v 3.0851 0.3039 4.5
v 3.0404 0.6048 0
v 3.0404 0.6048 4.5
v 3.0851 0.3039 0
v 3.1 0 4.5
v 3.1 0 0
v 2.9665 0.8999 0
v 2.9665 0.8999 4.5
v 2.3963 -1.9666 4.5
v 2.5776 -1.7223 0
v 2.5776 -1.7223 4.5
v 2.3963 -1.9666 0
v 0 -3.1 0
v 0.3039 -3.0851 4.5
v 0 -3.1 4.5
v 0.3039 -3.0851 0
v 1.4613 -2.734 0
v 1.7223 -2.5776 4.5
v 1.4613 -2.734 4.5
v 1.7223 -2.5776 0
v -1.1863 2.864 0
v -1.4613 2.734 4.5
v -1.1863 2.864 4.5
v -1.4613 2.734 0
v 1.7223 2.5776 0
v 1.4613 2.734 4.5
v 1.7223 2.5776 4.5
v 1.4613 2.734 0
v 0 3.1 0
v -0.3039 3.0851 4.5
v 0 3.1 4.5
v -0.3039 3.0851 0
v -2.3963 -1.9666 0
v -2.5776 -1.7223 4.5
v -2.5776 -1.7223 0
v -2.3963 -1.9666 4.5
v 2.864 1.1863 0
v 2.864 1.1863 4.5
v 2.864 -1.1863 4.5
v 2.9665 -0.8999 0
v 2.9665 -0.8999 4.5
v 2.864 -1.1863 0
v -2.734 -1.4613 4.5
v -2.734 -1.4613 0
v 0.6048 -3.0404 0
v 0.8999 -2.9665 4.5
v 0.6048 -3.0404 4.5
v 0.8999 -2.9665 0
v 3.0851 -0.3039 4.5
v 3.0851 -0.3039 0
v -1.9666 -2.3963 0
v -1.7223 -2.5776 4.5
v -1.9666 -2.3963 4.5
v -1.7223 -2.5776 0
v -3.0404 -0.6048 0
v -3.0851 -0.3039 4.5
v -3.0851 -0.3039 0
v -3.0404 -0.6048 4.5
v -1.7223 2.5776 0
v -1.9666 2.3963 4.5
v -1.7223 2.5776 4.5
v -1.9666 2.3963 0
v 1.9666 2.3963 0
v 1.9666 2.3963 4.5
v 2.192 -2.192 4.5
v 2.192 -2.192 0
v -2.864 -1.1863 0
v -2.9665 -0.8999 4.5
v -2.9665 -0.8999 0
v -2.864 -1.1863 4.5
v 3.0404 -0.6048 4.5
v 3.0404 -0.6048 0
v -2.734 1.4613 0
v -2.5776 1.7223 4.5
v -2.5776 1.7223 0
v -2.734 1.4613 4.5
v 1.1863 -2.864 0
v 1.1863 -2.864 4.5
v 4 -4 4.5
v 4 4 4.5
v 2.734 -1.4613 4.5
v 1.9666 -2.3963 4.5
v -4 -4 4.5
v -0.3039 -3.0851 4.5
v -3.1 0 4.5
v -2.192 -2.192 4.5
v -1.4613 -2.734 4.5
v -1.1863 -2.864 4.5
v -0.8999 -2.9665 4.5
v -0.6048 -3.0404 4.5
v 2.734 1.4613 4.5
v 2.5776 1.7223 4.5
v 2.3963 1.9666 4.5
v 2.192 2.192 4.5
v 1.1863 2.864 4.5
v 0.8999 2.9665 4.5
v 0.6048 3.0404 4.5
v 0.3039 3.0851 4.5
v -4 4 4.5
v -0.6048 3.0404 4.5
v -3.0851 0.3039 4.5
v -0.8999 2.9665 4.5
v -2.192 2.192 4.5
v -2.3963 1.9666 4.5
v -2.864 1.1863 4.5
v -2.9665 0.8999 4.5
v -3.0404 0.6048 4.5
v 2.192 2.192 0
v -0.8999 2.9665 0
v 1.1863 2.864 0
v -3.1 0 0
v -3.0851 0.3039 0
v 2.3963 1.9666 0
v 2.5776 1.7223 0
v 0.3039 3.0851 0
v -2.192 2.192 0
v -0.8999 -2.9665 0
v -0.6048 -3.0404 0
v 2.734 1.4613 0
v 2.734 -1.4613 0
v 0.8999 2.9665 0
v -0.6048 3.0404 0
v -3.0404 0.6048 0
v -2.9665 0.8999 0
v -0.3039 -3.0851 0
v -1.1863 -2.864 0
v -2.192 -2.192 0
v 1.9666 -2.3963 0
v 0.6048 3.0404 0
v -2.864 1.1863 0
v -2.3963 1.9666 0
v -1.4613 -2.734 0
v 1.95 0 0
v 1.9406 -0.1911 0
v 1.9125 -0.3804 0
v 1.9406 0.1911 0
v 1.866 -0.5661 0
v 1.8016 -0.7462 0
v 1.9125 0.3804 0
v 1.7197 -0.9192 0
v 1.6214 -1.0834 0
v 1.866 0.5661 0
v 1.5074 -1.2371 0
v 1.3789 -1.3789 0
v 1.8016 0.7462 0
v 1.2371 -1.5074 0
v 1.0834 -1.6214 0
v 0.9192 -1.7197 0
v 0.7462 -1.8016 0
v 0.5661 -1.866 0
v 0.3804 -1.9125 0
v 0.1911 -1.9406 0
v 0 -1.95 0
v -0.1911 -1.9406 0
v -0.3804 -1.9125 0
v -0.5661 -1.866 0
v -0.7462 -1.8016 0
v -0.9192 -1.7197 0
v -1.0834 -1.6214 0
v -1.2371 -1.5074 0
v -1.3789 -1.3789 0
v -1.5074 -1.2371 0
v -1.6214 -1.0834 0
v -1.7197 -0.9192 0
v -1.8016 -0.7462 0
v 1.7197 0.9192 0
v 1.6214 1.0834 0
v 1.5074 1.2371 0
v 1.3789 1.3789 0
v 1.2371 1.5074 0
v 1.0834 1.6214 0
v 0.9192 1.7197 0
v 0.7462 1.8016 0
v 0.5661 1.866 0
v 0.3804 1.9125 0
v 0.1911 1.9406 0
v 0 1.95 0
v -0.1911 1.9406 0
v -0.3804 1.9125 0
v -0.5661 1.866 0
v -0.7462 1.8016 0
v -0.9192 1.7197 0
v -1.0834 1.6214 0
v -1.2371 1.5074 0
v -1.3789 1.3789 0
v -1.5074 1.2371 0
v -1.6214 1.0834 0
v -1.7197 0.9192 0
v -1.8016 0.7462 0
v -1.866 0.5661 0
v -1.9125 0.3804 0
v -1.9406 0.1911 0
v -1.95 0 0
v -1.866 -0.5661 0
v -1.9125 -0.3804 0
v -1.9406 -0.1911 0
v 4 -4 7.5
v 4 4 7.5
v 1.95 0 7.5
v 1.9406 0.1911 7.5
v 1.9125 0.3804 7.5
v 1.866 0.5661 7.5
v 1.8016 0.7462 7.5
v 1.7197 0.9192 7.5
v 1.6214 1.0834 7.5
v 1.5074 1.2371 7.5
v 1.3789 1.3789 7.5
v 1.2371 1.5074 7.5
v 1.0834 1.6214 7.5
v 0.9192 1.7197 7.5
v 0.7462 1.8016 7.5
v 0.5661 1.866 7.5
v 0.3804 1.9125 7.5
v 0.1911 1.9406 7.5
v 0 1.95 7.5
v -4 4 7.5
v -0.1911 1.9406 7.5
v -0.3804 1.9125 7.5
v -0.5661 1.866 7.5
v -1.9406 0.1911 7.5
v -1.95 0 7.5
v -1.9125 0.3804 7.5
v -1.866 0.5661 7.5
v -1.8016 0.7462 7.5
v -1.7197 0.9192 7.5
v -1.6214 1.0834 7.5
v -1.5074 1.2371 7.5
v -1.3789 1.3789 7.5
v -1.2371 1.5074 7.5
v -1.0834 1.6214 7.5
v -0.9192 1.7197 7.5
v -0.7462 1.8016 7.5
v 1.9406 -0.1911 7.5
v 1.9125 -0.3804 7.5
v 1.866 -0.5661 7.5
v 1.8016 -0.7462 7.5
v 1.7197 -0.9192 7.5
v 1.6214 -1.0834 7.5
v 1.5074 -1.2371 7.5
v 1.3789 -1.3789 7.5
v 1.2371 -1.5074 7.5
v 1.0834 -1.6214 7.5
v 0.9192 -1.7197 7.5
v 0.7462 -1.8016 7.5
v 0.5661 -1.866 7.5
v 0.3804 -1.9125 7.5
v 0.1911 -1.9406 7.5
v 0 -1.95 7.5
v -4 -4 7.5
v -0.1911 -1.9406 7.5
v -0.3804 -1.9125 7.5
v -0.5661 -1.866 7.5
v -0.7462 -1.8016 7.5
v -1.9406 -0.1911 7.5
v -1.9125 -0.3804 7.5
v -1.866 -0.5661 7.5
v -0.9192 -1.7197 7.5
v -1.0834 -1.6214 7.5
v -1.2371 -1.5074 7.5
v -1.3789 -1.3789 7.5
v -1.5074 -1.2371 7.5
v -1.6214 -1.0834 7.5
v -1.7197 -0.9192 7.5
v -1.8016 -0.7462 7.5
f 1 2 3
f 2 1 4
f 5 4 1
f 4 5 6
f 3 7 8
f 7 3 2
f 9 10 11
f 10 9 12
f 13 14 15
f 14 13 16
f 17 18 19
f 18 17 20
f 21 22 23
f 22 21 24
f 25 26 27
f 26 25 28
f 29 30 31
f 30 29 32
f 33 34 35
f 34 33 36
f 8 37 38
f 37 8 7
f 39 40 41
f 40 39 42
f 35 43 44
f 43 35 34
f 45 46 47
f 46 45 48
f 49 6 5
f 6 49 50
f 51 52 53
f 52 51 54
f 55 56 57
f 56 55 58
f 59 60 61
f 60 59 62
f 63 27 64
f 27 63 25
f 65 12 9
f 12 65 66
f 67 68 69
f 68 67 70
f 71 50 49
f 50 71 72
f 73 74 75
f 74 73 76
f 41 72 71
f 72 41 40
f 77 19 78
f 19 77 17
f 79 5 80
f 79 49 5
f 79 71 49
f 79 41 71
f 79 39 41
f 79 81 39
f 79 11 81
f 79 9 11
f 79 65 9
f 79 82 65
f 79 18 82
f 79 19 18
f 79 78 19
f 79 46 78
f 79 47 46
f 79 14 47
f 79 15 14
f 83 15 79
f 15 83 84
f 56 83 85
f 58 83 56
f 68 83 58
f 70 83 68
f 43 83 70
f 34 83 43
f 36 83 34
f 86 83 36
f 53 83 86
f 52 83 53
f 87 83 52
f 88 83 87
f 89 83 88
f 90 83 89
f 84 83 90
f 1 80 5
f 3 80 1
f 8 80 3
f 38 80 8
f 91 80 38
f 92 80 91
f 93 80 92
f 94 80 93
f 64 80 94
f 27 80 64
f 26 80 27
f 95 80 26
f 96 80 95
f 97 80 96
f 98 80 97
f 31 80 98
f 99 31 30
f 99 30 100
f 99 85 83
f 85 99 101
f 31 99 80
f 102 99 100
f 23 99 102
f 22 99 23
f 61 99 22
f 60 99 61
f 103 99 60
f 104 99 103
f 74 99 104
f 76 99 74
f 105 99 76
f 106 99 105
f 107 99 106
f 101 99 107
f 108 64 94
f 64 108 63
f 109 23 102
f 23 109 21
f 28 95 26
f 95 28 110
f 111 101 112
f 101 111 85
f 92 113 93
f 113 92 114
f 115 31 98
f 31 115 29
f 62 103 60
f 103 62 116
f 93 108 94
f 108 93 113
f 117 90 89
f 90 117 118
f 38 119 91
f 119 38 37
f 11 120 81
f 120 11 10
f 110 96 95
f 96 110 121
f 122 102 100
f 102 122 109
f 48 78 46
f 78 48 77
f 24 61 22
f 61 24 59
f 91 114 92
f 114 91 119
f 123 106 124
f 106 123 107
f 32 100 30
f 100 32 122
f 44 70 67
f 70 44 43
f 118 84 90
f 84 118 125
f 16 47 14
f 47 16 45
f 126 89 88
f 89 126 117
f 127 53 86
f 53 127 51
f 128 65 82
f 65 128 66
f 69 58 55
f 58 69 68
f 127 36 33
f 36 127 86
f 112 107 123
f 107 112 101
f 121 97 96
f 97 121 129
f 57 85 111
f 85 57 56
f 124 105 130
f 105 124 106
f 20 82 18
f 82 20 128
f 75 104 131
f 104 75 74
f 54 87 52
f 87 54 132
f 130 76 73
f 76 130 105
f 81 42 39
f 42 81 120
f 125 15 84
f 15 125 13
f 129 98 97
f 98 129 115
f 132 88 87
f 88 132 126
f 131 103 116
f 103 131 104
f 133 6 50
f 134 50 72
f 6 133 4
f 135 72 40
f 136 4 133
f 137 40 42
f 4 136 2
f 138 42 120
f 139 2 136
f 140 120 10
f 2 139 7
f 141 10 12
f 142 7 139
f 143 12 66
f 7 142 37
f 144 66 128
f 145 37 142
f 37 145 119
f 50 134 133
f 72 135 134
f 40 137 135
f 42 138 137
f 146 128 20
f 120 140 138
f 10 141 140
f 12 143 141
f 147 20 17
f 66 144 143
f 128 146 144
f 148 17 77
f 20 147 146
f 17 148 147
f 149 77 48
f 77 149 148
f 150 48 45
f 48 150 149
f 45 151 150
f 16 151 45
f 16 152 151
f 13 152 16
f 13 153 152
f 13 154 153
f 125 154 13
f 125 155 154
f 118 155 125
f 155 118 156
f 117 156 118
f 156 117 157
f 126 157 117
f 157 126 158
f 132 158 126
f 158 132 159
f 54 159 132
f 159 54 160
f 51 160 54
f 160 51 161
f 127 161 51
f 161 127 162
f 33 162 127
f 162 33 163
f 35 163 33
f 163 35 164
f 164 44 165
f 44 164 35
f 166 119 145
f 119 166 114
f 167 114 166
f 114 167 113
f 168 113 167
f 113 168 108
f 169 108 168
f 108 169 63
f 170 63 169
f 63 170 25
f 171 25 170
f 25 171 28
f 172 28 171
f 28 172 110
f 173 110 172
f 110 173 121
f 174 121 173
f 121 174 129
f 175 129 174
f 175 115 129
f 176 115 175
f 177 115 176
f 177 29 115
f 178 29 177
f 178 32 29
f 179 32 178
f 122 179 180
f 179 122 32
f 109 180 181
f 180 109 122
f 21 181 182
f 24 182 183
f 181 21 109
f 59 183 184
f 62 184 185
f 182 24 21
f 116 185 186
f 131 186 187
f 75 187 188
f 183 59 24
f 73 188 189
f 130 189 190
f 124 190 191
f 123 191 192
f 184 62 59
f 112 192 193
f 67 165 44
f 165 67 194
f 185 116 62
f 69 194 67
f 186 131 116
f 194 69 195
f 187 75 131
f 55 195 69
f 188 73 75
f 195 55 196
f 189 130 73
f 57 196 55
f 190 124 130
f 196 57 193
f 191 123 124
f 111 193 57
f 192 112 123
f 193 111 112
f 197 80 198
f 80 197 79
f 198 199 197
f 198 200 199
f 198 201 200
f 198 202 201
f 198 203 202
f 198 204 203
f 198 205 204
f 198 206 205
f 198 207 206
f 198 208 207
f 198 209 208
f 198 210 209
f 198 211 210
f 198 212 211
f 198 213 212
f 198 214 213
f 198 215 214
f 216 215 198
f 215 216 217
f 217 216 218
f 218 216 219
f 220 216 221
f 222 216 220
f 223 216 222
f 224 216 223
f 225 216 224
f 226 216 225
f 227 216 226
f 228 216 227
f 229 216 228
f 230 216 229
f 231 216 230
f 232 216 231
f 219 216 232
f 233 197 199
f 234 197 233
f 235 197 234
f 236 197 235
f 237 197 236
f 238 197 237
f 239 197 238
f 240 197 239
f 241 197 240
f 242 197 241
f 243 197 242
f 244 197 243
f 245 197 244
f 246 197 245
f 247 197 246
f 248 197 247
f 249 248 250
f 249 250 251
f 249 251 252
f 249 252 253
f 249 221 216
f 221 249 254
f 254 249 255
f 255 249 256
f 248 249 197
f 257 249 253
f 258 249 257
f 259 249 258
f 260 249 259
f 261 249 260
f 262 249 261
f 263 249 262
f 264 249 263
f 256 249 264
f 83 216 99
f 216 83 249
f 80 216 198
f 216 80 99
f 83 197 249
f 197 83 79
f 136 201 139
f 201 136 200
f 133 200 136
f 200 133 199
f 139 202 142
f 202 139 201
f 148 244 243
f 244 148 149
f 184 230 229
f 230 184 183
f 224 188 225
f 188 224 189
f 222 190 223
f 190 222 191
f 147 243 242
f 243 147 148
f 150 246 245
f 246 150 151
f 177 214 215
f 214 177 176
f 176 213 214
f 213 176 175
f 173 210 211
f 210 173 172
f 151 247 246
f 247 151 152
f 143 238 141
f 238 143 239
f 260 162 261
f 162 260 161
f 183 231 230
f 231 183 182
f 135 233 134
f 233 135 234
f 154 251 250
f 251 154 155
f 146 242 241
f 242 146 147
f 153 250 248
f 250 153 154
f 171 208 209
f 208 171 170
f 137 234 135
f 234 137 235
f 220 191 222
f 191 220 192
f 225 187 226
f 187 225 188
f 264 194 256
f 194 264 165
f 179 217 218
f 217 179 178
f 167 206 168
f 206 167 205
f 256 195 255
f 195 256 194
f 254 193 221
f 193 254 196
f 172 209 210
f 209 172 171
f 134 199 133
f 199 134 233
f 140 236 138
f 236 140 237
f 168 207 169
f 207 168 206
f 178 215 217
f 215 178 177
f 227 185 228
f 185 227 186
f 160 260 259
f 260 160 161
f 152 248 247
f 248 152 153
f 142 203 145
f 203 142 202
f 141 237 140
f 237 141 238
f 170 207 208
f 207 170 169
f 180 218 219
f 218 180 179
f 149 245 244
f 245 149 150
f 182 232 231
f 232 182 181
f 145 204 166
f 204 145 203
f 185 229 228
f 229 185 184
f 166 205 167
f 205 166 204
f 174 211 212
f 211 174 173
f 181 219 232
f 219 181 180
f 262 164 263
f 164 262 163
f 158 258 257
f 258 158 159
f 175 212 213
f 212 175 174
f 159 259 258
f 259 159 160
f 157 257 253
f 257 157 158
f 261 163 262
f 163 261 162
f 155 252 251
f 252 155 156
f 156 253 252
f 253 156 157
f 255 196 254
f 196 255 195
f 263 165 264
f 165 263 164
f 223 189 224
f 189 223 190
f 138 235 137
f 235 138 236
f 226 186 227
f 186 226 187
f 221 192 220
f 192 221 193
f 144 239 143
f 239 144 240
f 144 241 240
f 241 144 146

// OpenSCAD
// file: assembly.scad
$fn = 64;

tube_d = 11.2;
wall_thickness = 1.5;
plate_thickness = 1.5;
plate_width = 21;
plate_length = 70;
plate_radius = 3;
bracket_1_l = 15;
bracket_2_l = 14.7;
bracket_1_pos = 10;
bracket_2_pos = 47.7;
hole_1_pos = 15;
hole_2_pos = 54.5;
peg_h = 4.5;
peg_cube_w = 8;
peg_cube_h = 3;
peg_id = 3.9;
peg_od = 6.2;
peg_drill_d = 2;


module plate() {
  translate([plate_radius, -plate_width / 2 + plate_radius, 0]) {
    linear_extrude(plate_thickness) {
      minkowski() {
        square([plate_length - plate_radius * 2, plate_width - plate_radius * 2]);
        circle(r = plate_radius);
      }
    }
  }
}

module bracket(l) {
  translate([l / 2, 0, tube_d / 2 + wall_thickness + plate_thickness]) {
    rotate([0, 90, 0]) {
      difference() {
        hull() {
          cylinder(l, r = tube_d / 2 + wall_thickness, center = true);
          translate([wall_thickness / 2 + tube_d / 2, 0, 0]) {
            cube([wall_thickness, tube_d + (wall_thickness * 2), l], center = true);
          }
        }
        cylinder(l + 2, d = tube_d, center = true);
      }
    }
  }
}

module bracket_1() {
  translate([bracket_1_pos, 0, 0]) {
    bracket(bracket_1_l);
  }
}

module bracket_2() {
  translate([bracket_2_pos, 0, 0]) {
    bracket(bracket_2_l);
  }
}

module outer() {
  cylinder(h = peg_h, d = peg_od);
  translate([0, 0, peg_h + peg_cube_h / 2]) { 
    cube([peg_cube_w, peg_cube_w, peg_cube_h], center = true);;
  }
}

module drill() {
  translate([0, 0, -1]) {
    cylinder(h = 100, d = peg_drill_d); 
    cylinder(h = peg_h + 6, d = peg_id); 
  }
}

module bracket_drill() {
  translate([0, 0, -peg_h]) {
    outer();
    drill();
  }
}

module hole_1() {
  translate([hole_1_pos, 0, 0]) {
    bracket_drill();
  }
}

module hole_2() {
  translate([hole_2_pos, 0, 0]) {
    bracket_drill();
  }
}

plate();
bracket_1();
bracket_2();
hole_1();
hole_2();
// main file
$fn = 64;

use <assembly.scad>

difference() {
  outer();
  drill();
}
